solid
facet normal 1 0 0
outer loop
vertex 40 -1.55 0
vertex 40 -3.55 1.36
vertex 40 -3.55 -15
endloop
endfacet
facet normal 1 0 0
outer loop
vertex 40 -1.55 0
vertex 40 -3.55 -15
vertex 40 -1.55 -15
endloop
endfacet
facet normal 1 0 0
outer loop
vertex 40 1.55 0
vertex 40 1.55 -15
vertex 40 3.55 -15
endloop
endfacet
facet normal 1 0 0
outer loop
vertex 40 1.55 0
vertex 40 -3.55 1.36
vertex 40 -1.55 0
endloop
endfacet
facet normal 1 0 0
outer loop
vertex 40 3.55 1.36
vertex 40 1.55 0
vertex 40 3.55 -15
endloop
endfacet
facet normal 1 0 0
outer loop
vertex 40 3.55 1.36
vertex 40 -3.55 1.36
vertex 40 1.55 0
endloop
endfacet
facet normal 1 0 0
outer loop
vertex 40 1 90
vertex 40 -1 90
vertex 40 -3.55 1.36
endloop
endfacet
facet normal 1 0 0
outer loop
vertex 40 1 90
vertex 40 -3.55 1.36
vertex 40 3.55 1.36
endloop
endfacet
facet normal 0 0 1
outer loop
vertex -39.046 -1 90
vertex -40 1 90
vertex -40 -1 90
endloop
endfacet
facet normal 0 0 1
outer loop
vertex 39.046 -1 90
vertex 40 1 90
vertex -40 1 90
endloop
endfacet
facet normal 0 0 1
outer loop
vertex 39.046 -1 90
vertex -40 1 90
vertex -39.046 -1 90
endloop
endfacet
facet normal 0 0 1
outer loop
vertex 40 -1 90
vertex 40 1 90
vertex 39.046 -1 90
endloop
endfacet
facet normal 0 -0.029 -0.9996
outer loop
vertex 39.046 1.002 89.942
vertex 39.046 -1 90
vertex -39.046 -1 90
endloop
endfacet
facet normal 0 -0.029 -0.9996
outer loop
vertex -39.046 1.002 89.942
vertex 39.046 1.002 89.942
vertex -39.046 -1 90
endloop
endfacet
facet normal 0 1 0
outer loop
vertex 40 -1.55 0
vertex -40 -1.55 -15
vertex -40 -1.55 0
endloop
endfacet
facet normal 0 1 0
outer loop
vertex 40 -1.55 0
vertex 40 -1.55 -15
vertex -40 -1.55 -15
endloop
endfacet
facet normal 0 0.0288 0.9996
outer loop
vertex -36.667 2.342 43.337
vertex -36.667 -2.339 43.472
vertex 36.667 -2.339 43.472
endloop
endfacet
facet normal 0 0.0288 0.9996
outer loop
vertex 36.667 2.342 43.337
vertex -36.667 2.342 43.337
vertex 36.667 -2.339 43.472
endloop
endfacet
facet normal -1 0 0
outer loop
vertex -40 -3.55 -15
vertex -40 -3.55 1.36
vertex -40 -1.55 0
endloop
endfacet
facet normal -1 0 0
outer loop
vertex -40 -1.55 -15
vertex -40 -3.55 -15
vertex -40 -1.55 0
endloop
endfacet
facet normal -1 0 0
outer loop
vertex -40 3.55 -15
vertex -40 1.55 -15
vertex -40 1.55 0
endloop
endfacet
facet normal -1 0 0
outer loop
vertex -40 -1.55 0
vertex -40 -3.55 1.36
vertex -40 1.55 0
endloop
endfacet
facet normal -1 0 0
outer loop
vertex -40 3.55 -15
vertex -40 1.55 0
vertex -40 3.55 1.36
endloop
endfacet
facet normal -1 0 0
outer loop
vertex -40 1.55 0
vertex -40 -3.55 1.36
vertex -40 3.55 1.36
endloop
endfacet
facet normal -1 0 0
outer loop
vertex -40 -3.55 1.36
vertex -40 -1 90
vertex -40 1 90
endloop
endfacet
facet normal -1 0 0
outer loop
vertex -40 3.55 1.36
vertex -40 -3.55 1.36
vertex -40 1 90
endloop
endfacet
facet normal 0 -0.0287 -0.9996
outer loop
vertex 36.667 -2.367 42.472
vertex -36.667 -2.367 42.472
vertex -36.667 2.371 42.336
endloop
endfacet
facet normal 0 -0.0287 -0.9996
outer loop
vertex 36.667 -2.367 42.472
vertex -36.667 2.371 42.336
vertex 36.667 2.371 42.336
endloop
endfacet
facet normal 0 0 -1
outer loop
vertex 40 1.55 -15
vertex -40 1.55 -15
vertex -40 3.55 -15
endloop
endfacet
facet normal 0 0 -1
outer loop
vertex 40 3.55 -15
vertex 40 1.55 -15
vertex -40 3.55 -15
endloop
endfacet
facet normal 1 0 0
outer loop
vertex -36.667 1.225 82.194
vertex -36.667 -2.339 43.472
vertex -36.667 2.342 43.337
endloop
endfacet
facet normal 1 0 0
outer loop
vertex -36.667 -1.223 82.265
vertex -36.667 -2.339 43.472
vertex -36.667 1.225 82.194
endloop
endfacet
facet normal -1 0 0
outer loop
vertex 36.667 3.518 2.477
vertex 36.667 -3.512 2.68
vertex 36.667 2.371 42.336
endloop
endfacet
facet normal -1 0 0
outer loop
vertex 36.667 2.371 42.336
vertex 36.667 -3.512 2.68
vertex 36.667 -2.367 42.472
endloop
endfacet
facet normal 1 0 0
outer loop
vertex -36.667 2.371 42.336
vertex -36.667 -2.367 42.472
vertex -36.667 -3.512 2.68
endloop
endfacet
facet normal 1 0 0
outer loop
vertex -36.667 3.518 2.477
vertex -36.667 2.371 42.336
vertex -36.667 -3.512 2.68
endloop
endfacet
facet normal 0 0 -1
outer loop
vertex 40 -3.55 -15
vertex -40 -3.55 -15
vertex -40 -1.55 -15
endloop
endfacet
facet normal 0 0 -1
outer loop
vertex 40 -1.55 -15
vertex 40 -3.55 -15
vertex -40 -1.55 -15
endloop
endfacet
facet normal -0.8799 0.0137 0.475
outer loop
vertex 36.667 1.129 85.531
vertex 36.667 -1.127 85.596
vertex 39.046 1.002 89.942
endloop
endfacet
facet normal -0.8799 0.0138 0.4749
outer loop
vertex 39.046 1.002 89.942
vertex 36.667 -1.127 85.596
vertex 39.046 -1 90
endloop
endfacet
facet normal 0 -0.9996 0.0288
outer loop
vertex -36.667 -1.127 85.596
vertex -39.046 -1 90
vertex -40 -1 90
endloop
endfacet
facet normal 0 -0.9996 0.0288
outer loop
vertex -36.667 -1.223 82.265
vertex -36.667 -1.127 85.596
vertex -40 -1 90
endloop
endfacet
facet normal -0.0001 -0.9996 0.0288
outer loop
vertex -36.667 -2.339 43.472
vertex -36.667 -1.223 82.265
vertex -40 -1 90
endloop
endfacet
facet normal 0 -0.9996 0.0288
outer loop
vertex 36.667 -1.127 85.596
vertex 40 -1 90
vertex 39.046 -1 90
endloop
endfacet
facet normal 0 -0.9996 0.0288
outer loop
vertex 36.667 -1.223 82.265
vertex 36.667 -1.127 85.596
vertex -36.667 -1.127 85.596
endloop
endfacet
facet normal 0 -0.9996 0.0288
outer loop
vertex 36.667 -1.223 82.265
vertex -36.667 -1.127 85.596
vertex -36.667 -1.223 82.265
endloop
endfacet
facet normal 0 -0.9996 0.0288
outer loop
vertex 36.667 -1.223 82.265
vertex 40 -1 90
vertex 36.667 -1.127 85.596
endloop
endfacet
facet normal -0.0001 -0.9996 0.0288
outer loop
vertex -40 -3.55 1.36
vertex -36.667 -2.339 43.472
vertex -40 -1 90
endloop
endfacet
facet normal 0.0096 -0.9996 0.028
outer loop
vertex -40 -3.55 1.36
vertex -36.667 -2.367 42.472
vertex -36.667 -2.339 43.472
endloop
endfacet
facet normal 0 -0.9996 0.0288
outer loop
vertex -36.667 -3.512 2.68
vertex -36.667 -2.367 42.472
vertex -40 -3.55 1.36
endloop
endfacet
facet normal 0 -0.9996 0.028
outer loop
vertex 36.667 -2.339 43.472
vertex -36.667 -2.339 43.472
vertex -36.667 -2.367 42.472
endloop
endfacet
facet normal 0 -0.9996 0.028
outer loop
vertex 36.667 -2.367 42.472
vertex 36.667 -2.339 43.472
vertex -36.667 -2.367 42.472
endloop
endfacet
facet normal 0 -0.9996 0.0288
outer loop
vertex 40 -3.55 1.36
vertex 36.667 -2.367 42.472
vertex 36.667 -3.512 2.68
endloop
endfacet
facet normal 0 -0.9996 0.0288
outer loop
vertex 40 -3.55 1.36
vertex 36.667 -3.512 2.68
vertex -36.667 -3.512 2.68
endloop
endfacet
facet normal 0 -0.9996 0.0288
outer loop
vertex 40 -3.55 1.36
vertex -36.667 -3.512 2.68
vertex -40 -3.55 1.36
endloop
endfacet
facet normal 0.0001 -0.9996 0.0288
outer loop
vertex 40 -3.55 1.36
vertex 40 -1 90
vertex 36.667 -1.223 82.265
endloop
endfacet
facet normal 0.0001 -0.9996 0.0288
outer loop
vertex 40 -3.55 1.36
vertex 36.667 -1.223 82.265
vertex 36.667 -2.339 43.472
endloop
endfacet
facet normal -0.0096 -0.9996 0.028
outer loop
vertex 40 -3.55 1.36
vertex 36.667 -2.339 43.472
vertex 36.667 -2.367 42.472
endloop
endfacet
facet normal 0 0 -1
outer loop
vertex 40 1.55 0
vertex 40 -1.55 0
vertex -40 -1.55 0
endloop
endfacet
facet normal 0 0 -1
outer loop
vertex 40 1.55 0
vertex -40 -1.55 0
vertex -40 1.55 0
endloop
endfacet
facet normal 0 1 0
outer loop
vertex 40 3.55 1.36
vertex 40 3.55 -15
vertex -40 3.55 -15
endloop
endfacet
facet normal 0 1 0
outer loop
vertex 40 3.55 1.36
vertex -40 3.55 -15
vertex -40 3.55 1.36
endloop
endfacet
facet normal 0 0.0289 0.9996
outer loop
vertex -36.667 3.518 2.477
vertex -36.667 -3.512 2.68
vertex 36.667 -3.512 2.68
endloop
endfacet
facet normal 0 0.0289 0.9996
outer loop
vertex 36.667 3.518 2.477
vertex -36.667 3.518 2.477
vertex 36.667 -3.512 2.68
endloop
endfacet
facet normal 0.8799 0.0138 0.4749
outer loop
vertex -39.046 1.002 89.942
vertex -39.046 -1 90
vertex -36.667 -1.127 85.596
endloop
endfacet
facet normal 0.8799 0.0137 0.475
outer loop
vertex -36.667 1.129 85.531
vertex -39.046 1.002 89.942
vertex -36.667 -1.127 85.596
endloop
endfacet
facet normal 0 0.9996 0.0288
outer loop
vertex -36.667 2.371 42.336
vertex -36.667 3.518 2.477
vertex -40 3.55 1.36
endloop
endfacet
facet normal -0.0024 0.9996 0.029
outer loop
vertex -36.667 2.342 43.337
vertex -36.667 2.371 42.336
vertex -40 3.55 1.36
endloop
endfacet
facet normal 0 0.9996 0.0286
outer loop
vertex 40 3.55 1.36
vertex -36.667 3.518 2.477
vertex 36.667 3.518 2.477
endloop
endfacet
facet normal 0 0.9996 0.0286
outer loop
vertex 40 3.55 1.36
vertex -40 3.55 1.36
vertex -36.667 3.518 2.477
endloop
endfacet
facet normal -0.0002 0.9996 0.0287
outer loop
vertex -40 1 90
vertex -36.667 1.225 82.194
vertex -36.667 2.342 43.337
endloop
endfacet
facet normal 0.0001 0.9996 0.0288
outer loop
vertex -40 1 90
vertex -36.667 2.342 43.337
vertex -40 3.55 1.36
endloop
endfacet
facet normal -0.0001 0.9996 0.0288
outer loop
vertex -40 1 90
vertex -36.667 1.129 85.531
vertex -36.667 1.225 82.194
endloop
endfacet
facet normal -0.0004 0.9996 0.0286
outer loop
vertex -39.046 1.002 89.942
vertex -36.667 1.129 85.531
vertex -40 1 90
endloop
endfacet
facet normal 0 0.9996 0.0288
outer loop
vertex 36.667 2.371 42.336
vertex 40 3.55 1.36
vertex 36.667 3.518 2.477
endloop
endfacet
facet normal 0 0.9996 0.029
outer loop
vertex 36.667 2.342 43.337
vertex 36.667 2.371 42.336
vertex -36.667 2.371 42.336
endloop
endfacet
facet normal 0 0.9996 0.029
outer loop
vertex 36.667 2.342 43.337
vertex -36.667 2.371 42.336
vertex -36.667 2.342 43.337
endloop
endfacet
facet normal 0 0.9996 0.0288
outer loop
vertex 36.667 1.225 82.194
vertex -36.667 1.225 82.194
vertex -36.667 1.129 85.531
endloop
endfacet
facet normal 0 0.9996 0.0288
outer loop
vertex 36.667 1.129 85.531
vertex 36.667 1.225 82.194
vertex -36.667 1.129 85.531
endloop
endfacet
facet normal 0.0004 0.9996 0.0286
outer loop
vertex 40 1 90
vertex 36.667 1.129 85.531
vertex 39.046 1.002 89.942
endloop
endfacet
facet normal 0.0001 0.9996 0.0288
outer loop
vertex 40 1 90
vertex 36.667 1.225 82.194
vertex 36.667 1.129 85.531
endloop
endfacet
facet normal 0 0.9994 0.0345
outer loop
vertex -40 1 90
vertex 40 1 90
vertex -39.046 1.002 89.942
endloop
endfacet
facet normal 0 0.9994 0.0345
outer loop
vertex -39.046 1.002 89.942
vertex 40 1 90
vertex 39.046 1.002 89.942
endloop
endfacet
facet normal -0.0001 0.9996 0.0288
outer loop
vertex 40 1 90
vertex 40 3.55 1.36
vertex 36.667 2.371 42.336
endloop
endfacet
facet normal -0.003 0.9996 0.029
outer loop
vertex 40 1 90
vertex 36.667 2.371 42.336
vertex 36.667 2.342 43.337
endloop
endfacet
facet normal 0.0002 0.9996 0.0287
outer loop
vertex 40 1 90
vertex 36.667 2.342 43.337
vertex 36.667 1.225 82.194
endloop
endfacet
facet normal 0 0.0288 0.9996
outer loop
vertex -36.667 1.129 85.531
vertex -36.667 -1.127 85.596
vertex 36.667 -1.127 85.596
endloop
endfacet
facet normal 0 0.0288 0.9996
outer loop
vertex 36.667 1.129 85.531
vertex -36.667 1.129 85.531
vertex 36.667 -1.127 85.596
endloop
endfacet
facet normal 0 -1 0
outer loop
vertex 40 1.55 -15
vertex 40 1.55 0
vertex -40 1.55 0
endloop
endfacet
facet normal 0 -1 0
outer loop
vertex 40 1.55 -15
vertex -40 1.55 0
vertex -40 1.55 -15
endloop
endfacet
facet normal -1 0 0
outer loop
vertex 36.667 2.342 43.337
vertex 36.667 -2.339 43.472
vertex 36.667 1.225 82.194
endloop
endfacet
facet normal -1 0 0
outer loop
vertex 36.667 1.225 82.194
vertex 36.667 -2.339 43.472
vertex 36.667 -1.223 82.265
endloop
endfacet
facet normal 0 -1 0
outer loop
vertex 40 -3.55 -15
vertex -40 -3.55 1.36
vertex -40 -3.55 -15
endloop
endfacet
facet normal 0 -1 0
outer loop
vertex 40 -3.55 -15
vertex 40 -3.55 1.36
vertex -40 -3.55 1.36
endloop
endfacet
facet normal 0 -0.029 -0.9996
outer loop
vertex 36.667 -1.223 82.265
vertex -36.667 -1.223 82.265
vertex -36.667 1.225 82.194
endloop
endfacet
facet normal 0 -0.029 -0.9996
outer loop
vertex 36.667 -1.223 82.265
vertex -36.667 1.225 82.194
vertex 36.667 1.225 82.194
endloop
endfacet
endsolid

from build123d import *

# Parameters (mm, degrees)
F1_DEPTH = 40
F2_W     = 73.3336731791
F2_H     = 38.809017675
F2_H_2   = 1
F3_DEPTH = 7.5685053212


# Not quite as in the source:
# - a feature names something its author has since deleted; it is built from what else it names


with BuildPart() as f1:
    # F0 (on Right) → F1 (new body, symmetric)
    with BuildSketch(Plane.YZ):
        Polygon((-1.55, -15), (-1.55, 0), (1.55, 0), (1.55, -15), (3.55, -15), (3.55, 1.359729562), (1, 90), (-1, 90), (-3.55, 1.359729562), (-3.55, 0), (-3.55, -15), align=None)
    extrude(amount=F1_DEPTH, both=True)

    # F2 (on face) → F3 (cut, through all)
    with BuildSketch(Plane(origin=(0, -3.5861487682, 0.1031661943), x_dir=(1, 0, 0), z_dir=(0, -0.9995864588, 0.028756066))):
        Polygon((36.6668365896, 85.5283662677), (39.0464413553, 89.9340252282), (-39.0464413553, 89.9340252282), (-36.6668365896, 85.5283662677), align=None)
        with Locations((0, 62.7911531245)):
            Rectangle(F2_W, F2_H)
        with Locations((0, 41.886644287)):
            Rectangle(F2_W, F2_H_2)
        with Locations((0, 21.9821354495)):
            Rectangle(F2_W, F2_H)
    extrude(amount=-F3_DEPTH, mode=Mode.SUBTRACT)


solid = f1.part
